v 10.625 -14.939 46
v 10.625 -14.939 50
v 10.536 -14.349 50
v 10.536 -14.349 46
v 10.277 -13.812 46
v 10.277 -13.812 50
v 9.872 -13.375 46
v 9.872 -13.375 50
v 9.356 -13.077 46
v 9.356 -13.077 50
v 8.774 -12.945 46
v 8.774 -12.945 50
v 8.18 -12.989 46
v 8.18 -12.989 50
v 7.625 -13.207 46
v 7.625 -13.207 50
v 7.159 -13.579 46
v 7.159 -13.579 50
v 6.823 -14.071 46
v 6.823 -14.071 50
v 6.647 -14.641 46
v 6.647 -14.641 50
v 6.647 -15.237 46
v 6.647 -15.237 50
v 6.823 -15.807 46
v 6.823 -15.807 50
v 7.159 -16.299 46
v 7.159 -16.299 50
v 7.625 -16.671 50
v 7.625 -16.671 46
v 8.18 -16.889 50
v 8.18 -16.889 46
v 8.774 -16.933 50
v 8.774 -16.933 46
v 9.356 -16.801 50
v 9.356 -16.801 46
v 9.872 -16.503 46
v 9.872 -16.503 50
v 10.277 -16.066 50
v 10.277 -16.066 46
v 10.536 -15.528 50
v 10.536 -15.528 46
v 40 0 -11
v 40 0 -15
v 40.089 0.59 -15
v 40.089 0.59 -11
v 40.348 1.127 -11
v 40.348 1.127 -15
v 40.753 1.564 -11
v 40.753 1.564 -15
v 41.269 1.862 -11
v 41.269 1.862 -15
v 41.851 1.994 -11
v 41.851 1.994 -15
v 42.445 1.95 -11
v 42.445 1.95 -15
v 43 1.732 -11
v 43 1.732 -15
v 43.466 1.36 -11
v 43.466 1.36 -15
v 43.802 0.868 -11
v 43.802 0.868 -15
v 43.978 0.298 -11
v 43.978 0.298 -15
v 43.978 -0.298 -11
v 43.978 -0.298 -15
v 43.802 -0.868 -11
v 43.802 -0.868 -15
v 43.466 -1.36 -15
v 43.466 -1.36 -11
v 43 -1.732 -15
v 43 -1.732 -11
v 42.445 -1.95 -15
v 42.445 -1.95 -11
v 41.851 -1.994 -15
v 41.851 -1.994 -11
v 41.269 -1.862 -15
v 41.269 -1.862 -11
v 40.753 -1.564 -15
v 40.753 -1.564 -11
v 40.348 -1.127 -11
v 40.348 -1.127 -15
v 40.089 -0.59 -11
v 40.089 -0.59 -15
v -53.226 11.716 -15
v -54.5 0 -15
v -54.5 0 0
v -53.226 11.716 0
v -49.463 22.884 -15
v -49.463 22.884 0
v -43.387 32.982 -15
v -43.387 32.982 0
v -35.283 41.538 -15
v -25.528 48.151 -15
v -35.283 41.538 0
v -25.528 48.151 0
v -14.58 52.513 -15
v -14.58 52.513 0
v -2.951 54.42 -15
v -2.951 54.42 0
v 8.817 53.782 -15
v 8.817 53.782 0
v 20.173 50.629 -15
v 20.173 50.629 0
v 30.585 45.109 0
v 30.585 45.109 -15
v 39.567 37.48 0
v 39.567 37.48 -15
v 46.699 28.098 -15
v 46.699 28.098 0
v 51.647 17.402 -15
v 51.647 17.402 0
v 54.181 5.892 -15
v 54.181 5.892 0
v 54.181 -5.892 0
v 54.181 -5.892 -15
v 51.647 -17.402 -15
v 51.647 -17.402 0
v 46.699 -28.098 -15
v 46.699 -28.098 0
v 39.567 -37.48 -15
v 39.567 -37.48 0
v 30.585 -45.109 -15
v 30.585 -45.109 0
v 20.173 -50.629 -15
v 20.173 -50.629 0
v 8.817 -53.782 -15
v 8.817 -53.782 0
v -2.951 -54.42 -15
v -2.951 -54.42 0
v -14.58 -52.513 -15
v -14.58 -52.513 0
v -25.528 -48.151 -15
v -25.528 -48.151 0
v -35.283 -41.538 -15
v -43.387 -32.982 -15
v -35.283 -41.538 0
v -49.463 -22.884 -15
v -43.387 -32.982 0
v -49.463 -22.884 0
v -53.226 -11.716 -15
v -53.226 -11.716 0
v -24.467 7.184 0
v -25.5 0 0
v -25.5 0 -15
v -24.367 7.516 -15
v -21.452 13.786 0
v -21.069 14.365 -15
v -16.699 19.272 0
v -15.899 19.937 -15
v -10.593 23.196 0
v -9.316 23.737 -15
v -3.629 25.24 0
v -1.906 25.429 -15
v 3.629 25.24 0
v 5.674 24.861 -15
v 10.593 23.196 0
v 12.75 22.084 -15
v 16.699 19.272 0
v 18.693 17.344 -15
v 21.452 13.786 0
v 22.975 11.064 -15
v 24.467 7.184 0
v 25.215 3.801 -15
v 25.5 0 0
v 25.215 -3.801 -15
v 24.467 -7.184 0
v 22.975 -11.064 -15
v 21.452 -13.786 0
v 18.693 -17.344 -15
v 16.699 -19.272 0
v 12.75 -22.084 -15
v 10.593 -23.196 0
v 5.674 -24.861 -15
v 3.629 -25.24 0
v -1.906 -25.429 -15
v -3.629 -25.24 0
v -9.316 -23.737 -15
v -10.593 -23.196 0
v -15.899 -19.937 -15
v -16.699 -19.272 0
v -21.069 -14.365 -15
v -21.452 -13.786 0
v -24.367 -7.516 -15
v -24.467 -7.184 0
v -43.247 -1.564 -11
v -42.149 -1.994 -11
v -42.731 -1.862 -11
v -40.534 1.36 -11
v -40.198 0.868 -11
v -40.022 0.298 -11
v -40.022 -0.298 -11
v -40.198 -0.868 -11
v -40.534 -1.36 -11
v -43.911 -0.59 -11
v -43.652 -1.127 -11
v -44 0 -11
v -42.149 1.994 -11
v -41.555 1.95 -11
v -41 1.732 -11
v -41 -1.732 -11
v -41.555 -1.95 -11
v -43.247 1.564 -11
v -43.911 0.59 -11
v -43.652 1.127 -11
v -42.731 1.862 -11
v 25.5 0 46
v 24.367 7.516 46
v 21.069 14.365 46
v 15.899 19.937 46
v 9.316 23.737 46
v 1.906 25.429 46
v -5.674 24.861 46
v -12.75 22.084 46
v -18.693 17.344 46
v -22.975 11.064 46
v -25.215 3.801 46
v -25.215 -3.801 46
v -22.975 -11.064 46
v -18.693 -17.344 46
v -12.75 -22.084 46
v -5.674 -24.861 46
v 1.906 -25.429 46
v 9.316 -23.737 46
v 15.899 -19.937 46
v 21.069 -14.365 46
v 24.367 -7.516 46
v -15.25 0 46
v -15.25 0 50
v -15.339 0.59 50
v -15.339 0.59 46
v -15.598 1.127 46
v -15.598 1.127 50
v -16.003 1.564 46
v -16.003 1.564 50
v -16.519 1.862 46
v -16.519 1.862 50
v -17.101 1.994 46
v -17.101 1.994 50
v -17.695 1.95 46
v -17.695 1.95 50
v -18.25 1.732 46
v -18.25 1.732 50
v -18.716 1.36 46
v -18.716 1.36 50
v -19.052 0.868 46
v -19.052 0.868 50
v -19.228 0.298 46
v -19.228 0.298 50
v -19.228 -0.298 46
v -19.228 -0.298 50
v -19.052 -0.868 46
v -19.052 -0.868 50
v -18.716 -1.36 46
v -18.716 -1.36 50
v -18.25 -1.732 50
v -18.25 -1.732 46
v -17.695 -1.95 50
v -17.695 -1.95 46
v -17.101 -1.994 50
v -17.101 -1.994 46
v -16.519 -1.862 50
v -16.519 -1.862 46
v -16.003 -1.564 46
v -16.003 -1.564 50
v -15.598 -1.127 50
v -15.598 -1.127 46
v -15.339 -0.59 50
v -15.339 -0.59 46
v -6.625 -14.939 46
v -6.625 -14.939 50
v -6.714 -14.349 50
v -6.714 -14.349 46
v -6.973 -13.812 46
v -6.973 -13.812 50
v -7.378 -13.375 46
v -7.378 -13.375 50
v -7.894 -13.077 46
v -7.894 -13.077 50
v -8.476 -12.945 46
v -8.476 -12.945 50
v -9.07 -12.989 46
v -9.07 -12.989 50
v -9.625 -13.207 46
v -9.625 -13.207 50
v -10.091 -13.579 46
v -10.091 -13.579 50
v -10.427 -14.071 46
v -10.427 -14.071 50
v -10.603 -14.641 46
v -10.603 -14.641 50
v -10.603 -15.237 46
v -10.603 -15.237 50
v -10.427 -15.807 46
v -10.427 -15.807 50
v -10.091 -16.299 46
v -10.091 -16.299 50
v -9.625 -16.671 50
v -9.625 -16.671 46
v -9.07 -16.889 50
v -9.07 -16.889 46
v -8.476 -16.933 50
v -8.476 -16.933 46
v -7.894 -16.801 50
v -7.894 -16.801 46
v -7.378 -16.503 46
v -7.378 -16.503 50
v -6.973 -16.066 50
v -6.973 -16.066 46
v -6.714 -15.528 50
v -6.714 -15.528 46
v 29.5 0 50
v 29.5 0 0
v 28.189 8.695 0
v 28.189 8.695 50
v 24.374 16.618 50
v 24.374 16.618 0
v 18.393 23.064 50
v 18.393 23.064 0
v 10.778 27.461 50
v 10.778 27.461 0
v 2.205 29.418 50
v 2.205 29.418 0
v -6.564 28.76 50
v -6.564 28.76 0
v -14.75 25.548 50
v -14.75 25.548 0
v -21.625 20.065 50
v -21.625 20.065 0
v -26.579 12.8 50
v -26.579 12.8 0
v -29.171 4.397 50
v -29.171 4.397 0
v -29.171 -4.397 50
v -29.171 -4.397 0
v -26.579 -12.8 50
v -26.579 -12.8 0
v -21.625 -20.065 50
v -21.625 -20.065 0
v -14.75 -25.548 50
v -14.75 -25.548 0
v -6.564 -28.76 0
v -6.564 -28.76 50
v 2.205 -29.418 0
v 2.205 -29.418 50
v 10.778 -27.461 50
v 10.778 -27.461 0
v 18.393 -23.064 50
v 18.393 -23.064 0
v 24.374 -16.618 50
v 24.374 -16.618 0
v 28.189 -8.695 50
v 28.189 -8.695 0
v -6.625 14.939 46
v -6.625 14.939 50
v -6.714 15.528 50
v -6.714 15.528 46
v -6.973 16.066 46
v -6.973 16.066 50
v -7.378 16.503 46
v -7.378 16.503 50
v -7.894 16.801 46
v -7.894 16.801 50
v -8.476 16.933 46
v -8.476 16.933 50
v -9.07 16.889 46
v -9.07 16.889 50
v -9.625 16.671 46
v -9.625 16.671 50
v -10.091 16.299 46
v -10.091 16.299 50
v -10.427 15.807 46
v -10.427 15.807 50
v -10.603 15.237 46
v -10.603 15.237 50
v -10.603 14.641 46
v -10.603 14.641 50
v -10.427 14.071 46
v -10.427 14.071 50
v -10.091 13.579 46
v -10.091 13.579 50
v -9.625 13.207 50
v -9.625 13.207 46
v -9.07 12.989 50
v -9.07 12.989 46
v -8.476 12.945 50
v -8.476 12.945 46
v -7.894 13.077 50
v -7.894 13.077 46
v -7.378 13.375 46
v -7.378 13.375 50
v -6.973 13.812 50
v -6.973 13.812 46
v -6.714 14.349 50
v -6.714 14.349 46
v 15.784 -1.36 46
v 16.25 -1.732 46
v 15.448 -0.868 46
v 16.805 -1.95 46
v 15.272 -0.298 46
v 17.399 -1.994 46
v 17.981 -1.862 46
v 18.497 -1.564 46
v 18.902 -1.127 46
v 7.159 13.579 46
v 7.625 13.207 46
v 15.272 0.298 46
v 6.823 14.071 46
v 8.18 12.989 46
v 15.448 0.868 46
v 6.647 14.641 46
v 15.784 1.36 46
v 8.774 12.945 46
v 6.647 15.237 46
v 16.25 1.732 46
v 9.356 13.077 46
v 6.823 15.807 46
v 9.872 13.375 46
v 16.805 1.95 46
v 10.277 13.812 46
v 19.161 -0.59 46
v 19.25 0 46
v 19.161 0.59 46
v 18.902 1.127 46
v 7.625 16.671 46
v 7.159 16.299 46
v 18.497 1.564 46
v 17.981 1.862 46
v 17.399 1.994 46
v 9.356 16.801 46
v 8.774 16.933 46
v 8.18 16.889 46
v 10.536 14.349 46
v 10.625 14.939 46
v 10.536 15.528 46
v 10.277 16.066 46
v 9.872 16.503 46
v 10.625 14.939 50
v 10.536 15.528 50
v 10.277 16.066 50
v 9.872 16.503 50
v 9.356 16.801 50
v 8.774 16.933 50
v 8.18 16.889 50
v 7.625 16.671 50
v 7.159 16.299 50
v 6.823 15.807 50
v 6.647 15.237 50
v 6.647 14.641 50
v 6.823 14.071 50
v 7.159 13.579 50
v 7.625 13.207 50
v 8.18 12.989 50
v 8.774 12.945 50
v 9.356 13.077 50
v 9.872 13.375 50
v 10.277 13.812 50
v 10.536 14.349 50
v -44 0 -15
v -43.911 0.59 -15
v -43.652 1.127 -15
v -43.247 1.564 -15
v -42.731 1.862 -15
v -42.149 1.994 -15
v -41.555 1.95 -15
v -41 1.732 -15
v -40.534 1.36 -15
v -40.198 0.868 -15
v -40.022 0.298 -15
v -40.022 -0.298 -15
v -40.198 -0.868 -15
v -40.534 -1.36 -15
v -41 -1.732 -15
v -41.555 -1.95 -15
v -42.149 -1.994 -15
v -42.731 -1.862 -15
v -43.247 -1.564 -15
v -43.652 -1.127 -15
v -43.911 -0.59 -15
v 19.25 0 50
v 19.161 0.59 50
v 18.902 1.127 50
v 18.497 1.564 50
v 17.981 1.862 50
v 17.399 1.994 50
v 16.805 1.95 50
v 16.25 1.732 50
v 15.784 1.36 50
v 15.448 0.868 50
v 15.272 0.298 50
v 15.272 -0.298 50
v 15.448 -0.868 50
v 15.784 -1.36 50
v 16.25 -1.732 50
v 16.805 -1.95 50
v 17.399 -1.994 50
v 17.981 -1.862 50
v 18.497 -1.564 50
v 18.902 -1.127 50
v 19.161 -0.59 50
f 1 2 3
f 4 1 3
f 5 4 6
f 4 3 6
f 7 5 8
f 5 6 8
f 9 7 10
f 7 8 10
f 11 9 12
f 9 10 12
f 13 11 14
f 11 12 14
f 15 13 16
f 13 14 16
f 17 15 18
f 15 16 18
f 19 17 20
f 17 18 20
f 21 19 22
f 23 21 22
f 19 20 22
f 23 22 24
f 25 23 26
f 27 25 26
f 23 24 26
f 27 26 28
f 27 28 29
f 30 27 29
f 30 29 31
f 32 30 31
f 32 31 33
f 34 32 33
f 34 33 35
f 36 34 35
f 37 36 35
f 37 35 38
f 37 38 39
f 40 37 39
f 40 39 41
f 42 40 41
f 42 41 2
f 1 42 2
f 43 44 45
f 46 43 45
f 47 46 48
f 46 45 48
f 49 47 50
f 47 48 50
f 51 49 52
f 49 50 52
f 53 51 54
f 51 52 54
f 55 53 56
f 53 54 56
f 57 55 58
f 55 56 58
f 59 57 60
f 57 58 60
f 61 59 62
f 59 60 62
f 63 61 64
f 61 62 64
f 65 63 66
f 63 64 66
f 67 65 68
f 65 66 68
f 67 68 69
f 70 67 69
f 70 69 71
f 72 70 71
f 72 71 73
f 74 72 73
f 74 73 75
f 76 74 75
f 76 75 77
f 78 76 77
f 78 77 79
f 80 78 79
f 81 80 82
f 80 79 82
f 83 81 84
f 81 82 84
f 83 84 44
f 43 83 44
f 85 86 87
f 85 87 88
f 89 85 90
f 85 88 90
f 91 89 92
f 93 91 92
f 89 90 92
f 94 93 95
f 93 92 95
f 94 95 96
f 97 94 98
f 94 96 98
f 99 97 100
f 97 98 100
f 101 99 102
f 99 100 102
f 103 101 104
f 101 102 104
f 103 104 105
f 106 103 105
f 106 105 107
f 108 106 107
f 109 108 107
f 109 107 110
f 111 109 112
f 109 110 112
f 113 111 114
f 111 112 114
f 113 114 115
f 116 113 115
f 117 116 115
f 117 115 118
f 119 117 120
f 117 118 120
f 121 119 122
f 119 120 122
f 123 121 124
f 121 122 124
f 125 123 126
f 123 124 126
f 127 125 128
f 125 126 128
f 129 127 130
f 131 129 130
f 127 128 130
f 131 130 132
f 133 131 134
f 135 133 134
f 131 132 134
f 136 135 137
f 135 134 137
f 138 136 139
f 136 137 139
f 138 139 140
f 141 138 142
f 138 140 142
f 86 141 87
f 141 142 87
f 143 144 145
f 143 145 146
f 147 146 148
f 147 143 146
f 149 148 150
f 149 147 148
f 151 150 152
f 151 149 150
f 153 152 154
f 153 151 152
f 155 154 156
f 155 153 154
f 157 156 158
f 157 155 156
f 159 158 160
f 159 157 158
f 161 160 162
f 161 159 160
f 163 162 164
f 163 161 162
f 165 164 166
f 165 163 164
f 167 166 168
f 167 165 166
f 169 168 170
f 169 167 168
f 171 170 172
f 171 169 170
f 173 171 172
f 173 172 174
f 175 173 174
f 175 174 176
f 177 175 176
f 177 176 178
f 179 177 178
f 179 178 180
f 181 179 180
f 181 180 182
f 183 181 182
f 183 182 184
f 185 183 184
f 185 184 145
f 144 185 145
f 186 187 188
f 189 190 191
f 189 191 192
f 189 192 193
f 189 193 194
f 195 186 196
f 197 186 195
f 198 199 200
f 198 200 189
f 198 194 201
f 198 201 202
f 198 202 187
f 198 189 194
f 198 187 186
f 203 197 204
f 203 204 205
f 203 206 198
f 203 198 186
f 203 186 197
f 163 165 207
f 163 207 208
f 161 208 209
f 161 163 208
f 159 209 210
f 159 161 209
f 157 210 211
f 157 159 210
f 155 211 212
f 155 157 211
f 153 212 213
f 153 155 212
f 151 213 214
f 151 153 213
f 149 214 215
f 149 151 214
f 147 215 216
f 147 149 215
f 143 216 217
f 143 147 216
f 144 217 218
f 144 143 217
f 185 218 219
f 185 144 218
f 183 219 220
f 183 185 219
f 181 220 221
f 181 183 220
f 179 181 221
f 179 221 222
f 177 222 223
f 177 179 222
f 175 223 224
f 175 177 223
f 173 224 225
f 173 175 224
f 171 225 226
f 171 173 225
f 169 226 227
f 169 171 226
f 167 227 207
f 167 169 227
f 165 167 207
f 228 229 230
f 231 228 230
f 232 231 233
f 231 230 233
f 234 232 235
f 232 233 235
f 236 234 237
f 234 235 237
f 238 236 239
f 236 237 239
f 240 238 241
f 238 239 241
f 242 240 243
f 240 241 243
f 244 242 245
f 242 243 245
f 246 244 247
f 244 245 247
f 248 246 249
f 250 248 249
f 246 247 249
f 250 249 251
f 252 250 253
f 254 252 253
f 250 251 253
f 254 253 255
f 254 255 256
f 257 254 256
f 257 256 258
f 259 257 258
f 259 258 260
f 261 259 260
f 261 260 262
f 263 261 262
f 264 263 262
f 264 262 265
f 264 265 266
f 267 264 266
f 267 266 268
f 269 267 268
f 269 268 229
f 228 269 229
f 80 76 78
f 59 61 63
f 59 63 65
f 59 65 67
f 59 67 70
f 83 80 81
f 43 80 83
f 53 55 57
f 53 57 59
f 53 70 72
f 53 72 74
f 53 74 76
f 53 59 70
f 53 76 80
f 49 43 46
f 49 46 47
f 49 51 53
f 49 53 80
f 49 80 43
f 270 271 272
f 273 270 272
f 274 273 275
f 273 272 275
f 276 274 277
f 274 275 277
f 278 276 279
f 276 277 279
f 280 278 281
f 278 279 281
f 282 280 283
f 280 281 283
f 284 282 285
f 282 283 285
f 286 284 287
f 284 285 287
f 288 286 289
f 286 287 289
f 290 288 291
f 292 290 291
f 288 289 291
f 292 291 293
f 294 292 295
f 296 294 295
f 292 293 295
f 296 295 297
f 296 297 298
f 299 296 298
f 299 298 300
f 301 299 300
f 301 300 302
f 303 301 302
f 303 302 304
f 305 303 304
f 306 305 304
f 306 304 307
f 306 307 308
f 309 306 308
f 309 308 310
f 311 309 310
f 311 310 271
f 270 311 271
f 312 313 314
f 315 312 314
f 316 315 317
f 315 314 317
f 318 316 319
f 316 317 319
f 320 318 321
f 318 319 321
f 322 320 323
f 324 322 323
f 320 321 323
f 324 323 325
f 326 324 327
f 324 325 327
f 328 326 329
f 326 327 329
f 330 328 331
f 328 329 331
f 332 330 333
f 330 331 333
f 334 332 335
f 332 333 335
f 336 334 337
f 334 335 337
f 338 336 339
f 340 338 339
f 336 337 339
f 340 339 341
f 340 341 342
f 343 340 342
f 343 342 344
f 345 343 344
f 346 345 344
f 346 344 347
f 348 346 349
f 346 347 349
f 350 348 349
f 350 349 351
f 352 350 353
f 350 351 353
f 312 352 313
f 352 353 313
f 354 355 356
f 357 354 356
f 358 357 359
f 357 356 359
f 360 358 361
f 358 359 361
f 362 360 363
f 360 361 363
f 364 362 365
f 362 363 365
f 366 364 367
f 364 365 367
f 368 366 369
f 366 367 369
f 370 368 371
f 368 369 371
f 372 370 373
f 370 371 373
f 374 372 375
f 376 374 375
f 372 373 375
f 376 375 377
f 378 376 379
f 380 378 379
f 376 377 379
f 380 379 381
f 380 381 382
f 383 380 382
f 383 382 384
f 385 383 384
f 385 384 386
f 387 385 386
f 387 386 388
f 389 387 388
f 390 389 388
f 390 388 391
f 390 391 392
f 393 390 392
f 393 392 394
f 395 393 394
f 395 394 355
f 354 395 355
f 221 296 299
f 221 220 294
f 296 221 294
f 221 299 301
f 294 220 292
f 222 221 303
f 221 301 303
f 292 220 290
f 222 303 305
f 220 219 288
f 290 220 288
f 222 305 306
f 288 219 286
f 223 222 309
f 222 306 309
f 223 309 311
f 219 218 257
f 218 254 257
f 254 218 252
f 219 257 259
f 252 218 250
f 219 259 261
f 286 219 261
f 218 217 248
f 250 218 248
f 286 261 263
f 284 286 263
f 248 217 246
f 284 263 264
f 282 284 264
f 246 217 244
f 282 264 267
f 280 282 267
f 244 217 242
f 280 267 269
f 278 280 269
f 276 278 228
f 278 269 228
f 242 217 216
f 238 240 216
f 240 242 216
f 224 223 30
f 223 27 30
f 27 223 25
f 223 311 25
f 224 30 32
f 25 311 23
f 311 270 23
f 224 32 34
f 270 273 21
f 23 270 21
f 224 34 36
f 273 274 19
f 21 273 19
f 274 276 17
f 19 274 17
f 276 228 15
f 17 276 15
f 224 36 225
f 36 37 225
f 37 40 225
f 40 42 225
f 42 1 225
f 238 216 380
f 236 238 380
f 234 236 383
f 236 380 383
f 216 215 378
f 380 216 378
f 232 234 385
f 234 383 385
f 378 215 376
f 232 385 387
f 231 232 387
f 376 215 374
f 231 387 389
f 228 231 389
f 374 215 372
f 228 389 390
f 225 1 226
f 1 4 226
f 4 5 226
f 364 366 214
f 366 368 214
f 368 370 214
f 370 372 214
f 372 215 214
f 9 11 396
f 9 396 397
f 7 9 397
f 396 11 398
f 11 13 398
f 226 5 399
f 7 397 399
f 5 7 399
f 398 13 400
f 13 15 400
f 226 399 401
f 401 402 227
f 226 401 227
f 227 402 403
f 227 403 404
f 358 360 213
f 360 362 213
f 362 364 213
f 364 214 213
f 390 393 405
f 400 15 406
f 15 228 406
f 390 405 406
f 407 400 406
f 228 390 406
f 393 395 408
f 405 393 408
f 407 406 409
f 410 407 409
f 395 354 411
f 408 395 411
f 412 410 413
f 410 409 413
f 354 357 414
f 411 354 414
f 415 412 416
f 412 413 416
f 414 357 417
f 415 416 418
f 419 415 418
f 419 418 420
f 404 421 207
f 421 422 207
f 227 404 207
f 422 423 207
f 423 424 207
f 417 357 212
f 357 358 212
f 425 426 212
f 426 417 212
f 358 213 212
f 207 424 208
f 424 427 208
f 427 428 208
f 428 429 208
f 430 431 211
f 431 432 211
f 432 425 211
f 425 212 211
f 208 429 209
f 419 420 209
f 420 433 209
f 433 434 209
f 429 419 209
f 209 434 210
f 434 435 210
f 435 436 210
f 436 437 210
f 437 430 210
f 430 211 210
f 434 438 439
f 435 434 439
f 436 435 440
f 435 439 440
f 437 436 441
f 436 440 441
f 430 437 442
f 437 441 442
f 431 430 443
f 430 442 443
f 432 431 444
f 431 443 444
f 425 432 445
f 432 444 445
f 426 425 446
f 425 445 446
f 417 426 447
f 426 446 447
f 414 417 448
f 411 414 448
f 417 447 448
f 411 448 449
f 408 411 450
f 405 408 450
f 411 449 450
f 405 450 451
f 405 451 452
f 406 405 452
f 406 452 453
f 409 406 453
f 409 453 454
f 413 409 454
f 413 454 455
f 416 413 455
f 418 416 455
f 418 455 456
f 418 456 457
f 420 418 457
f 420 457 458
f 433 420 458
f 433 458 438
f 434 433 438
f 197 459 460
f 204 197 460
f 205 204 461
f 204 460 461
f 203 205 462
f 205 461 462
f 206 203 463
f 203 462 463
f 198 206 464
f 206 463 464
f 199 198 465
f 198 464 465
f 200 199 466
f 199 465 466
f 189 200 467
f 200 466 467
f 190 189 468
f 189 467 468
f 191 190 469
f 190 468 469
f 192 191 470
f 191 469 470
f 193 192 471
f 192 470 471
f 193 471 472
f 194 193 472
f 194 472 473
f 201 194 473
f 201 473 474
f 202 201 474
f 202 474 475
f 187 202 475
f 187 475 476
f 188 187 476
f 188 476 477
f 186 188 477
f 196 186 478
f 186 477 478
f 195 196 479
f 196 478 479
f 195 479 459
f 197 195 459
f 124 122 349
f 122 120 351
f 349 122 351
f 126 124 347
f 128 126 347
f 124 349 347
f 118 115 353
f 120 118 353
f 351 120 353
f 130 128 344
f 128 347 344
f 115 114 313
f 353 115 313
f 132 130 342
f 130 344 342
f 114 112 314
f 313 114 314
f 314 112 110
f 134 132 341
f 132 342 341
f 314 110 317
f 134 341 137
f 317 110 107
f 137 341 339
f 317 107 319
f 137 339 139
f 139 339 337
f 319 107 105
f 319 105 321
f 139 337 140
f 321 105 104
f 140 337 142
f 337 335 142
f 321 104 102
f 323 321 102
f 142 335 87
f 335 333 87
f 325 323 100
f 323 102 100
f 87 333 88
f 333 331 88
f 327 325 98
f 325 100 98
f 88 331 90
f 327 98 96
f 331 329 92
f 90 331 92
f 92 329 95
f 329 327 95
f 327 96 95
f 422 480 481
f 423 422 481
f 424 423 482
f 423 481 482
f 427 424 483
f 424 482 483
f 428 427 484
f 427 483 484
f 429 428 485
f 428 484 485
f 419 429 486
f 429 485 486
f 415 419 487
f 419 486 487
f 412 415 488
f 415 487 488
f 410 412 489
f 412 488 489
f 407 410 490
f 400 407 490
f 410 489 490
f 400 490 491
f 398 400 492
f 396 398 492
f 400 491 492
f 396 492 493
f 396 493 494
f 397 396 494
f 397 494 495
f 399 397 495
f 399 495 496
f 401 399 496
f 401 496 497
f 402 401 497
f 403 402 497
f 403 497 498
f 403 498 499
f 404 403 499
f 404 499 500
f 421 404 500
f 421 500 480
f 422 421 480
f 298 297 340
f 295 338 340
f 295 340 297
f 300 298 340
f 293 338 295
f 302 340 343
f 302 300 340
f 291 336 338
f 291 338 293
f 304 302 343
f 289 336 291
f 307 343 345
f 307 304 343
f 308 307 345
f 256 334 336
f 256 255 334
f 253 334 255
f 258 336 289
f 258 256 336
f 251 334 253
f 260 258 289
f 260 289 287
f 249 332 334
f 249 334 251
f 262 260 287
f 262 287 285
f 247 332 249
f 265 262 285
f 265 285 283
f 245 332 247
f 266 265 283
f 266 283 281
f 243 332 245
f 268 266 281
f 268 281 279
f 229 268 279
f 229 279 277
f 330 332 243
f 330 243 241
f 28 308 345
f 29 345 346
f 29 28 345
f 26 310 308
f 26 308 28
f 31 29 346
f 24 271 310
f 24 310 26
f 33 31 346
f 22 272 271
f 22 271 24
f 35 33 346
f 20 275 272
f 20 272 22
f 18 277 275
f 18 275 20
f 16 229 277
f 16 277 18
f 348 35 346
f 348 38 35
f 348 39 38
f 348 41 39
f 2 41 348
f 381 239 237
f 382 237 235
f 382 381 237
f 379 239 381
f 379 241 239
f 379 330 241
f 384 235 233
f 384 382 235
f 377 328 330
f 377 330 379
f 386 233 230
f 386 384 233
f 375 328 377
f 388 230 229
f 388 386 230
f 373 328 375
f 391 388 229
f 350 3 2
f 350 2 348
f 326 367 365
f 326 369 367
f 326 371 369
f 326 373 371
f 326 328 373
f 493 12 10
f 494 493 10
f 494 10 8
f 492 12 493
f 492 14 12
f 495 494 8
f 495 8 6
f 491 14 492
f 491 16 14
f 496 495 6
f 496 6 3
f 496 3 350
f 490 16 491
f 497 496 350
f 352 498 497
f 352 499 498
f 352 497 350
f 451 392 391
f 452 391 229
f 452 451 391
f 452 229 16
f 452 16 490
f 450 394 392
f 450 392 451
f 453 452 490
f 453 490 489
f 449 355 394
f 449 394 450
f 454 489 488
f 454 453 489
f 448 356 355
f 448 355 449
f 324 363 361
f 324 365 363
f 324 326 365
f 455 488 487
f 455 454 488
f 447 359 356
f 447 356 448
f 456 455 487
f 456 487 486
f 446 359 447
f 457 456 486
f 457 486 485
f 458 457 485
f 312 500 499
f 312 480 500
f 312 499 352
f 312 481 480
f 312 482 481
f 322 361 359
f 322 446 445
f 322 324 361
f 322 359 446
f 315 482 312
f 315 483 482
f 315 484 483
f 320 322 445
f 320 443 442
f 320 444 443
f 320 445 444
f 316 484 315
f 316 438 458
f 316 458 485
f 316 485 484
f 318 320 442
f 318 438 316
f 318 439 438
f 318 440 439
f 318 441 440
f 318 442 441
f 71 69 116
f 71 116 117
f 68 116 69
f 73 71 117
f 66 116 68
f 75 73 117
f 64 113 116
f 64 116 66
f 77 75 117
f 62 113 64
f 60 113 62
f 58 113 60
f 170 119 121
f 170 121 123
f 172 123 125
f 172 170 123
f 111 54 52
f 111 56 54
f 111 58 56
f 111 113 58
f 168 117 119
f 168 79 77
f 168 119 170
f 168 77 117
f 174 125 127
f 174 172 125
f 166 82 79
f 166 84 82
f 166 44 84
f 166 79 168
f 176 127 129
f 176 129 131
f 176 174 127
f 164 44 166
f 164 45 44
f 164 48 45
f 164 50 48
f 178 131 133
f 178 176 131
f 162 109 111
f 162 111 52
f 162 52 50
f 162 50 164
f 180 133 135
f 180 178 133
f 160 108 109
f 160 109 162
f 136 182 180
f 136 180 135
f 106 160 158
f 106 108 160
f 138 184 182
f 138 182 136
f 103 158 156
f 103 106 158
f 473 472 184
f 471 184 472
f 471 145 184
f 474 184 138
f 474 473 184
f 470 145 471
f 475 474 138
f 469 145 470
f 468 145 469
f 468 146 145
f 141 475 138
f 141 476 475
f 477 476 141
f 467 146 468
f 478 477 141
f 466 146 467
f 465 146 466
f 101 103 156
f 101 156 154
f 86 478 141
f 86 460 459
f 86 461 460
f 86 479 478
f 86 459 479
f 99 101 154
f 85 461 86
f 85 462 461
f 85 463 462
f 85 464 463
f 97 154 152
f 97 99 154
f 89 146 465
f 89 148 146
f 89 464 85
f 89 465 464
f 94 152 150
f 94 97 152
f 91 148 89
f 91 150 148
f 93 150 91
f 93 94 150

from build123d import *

# Parameters (mm, degrees)
SKETCH_1_R          = 29.5
EXTRUDE_1_DEPTH     = 50
SHELL_2_T           = -4
SKETCH_3_R          = 2
CUT_EXTRUDE_1_DEPTH = 66.119121616
SKETCH_5_R          = 54.5
SKETCH_5_R_2        = 29.5
SKETCH_5_R_3        = 25.5
EXTRUDE_7_DEPTH     = 15
SKETCH_6_R          = 2
CUT_EXTRUDE_3_DEPTH = 4


with BuildPart() as part:
    # 草图1 → 凸台-拉伸1 (new body)
    with BuildSketch(Plane.XY):
        Circle(SKETCH_1_R)
    extrude(amount=EXTRUDE_1_DEPTH)

    # 抽壳2
    shell_2_openings = [part.faces().sort_by_distance(p)[0] for p in [
        (0, 0, 0),
    ]]
    offset(amount=SHELL_2_T, openings=shell_2_openings, kind=Kind.INTERSECTION)

    # 草图3 → 切除-拉伸1 (cut, through all)
    with BuildSketch(Plane.XY.offset(50)):
        with Locations((-17.25, 0)):
            Circle(SKETCH_3_R)
        with Locations((-8.625, 14.938938215)):
            Circle(SKETCH_3_R)
        with Locations((8.625, 14.938938215)):
            Circle(SKETCH_3_R)
        with Locations((17.25, 0)):
            Circle(SKETCH_3_R)
        with Locations((8.625, -14.938938215)):
            Circle(SKETCH_3_R)
        with Locations((-8.625, -14.938938215)):
            Circle(SKETCH_3_R)
    extrude(amount=-CUT_EXTRUDE_1_DEPTH, mode=Mode.SUBTRACT)

    # 草图5 → 凸台-拉伸7 (add)
    with BuildSketch(Plane(origin=(0, 0, 0), x_dir=(-1, 0, 0), z_dir=(0, 0, -1))):
        Circle(SKETCH_5_R)
        with Locations(Location((0, 0, 0), (0, 0, 180))):
            Circle(SKETCH_5_R_2, mode=Mode.SUBTRACT)
        with Locations(Location((0, 0, 0), (0, 0, 180))):
            Circle(SKETCH_5_R_2)
        Circle(SKETCH_5_R_3, mode=Mode.SUBTRACT)
    extrude(amount=EXTRUDE_7_DEPTH)

    # 草图6 → 切除-拉伸3 (cut)
    with BuildSketch(Plane(origin=(0, 0, -15), x_dir=(-1, 0, 0), z_dir=(0, 0, -1))):
        with Locations((-42, 0)):
            Circle(SKETCH_6_R)
        with Locations((42, 0)):
            Circle(SKETCH_6_R)
    extrude(amount=-CUT_EXTRUDE_3_DEPTH, mode=Mode.SUBTRACT)


solid = part.part
